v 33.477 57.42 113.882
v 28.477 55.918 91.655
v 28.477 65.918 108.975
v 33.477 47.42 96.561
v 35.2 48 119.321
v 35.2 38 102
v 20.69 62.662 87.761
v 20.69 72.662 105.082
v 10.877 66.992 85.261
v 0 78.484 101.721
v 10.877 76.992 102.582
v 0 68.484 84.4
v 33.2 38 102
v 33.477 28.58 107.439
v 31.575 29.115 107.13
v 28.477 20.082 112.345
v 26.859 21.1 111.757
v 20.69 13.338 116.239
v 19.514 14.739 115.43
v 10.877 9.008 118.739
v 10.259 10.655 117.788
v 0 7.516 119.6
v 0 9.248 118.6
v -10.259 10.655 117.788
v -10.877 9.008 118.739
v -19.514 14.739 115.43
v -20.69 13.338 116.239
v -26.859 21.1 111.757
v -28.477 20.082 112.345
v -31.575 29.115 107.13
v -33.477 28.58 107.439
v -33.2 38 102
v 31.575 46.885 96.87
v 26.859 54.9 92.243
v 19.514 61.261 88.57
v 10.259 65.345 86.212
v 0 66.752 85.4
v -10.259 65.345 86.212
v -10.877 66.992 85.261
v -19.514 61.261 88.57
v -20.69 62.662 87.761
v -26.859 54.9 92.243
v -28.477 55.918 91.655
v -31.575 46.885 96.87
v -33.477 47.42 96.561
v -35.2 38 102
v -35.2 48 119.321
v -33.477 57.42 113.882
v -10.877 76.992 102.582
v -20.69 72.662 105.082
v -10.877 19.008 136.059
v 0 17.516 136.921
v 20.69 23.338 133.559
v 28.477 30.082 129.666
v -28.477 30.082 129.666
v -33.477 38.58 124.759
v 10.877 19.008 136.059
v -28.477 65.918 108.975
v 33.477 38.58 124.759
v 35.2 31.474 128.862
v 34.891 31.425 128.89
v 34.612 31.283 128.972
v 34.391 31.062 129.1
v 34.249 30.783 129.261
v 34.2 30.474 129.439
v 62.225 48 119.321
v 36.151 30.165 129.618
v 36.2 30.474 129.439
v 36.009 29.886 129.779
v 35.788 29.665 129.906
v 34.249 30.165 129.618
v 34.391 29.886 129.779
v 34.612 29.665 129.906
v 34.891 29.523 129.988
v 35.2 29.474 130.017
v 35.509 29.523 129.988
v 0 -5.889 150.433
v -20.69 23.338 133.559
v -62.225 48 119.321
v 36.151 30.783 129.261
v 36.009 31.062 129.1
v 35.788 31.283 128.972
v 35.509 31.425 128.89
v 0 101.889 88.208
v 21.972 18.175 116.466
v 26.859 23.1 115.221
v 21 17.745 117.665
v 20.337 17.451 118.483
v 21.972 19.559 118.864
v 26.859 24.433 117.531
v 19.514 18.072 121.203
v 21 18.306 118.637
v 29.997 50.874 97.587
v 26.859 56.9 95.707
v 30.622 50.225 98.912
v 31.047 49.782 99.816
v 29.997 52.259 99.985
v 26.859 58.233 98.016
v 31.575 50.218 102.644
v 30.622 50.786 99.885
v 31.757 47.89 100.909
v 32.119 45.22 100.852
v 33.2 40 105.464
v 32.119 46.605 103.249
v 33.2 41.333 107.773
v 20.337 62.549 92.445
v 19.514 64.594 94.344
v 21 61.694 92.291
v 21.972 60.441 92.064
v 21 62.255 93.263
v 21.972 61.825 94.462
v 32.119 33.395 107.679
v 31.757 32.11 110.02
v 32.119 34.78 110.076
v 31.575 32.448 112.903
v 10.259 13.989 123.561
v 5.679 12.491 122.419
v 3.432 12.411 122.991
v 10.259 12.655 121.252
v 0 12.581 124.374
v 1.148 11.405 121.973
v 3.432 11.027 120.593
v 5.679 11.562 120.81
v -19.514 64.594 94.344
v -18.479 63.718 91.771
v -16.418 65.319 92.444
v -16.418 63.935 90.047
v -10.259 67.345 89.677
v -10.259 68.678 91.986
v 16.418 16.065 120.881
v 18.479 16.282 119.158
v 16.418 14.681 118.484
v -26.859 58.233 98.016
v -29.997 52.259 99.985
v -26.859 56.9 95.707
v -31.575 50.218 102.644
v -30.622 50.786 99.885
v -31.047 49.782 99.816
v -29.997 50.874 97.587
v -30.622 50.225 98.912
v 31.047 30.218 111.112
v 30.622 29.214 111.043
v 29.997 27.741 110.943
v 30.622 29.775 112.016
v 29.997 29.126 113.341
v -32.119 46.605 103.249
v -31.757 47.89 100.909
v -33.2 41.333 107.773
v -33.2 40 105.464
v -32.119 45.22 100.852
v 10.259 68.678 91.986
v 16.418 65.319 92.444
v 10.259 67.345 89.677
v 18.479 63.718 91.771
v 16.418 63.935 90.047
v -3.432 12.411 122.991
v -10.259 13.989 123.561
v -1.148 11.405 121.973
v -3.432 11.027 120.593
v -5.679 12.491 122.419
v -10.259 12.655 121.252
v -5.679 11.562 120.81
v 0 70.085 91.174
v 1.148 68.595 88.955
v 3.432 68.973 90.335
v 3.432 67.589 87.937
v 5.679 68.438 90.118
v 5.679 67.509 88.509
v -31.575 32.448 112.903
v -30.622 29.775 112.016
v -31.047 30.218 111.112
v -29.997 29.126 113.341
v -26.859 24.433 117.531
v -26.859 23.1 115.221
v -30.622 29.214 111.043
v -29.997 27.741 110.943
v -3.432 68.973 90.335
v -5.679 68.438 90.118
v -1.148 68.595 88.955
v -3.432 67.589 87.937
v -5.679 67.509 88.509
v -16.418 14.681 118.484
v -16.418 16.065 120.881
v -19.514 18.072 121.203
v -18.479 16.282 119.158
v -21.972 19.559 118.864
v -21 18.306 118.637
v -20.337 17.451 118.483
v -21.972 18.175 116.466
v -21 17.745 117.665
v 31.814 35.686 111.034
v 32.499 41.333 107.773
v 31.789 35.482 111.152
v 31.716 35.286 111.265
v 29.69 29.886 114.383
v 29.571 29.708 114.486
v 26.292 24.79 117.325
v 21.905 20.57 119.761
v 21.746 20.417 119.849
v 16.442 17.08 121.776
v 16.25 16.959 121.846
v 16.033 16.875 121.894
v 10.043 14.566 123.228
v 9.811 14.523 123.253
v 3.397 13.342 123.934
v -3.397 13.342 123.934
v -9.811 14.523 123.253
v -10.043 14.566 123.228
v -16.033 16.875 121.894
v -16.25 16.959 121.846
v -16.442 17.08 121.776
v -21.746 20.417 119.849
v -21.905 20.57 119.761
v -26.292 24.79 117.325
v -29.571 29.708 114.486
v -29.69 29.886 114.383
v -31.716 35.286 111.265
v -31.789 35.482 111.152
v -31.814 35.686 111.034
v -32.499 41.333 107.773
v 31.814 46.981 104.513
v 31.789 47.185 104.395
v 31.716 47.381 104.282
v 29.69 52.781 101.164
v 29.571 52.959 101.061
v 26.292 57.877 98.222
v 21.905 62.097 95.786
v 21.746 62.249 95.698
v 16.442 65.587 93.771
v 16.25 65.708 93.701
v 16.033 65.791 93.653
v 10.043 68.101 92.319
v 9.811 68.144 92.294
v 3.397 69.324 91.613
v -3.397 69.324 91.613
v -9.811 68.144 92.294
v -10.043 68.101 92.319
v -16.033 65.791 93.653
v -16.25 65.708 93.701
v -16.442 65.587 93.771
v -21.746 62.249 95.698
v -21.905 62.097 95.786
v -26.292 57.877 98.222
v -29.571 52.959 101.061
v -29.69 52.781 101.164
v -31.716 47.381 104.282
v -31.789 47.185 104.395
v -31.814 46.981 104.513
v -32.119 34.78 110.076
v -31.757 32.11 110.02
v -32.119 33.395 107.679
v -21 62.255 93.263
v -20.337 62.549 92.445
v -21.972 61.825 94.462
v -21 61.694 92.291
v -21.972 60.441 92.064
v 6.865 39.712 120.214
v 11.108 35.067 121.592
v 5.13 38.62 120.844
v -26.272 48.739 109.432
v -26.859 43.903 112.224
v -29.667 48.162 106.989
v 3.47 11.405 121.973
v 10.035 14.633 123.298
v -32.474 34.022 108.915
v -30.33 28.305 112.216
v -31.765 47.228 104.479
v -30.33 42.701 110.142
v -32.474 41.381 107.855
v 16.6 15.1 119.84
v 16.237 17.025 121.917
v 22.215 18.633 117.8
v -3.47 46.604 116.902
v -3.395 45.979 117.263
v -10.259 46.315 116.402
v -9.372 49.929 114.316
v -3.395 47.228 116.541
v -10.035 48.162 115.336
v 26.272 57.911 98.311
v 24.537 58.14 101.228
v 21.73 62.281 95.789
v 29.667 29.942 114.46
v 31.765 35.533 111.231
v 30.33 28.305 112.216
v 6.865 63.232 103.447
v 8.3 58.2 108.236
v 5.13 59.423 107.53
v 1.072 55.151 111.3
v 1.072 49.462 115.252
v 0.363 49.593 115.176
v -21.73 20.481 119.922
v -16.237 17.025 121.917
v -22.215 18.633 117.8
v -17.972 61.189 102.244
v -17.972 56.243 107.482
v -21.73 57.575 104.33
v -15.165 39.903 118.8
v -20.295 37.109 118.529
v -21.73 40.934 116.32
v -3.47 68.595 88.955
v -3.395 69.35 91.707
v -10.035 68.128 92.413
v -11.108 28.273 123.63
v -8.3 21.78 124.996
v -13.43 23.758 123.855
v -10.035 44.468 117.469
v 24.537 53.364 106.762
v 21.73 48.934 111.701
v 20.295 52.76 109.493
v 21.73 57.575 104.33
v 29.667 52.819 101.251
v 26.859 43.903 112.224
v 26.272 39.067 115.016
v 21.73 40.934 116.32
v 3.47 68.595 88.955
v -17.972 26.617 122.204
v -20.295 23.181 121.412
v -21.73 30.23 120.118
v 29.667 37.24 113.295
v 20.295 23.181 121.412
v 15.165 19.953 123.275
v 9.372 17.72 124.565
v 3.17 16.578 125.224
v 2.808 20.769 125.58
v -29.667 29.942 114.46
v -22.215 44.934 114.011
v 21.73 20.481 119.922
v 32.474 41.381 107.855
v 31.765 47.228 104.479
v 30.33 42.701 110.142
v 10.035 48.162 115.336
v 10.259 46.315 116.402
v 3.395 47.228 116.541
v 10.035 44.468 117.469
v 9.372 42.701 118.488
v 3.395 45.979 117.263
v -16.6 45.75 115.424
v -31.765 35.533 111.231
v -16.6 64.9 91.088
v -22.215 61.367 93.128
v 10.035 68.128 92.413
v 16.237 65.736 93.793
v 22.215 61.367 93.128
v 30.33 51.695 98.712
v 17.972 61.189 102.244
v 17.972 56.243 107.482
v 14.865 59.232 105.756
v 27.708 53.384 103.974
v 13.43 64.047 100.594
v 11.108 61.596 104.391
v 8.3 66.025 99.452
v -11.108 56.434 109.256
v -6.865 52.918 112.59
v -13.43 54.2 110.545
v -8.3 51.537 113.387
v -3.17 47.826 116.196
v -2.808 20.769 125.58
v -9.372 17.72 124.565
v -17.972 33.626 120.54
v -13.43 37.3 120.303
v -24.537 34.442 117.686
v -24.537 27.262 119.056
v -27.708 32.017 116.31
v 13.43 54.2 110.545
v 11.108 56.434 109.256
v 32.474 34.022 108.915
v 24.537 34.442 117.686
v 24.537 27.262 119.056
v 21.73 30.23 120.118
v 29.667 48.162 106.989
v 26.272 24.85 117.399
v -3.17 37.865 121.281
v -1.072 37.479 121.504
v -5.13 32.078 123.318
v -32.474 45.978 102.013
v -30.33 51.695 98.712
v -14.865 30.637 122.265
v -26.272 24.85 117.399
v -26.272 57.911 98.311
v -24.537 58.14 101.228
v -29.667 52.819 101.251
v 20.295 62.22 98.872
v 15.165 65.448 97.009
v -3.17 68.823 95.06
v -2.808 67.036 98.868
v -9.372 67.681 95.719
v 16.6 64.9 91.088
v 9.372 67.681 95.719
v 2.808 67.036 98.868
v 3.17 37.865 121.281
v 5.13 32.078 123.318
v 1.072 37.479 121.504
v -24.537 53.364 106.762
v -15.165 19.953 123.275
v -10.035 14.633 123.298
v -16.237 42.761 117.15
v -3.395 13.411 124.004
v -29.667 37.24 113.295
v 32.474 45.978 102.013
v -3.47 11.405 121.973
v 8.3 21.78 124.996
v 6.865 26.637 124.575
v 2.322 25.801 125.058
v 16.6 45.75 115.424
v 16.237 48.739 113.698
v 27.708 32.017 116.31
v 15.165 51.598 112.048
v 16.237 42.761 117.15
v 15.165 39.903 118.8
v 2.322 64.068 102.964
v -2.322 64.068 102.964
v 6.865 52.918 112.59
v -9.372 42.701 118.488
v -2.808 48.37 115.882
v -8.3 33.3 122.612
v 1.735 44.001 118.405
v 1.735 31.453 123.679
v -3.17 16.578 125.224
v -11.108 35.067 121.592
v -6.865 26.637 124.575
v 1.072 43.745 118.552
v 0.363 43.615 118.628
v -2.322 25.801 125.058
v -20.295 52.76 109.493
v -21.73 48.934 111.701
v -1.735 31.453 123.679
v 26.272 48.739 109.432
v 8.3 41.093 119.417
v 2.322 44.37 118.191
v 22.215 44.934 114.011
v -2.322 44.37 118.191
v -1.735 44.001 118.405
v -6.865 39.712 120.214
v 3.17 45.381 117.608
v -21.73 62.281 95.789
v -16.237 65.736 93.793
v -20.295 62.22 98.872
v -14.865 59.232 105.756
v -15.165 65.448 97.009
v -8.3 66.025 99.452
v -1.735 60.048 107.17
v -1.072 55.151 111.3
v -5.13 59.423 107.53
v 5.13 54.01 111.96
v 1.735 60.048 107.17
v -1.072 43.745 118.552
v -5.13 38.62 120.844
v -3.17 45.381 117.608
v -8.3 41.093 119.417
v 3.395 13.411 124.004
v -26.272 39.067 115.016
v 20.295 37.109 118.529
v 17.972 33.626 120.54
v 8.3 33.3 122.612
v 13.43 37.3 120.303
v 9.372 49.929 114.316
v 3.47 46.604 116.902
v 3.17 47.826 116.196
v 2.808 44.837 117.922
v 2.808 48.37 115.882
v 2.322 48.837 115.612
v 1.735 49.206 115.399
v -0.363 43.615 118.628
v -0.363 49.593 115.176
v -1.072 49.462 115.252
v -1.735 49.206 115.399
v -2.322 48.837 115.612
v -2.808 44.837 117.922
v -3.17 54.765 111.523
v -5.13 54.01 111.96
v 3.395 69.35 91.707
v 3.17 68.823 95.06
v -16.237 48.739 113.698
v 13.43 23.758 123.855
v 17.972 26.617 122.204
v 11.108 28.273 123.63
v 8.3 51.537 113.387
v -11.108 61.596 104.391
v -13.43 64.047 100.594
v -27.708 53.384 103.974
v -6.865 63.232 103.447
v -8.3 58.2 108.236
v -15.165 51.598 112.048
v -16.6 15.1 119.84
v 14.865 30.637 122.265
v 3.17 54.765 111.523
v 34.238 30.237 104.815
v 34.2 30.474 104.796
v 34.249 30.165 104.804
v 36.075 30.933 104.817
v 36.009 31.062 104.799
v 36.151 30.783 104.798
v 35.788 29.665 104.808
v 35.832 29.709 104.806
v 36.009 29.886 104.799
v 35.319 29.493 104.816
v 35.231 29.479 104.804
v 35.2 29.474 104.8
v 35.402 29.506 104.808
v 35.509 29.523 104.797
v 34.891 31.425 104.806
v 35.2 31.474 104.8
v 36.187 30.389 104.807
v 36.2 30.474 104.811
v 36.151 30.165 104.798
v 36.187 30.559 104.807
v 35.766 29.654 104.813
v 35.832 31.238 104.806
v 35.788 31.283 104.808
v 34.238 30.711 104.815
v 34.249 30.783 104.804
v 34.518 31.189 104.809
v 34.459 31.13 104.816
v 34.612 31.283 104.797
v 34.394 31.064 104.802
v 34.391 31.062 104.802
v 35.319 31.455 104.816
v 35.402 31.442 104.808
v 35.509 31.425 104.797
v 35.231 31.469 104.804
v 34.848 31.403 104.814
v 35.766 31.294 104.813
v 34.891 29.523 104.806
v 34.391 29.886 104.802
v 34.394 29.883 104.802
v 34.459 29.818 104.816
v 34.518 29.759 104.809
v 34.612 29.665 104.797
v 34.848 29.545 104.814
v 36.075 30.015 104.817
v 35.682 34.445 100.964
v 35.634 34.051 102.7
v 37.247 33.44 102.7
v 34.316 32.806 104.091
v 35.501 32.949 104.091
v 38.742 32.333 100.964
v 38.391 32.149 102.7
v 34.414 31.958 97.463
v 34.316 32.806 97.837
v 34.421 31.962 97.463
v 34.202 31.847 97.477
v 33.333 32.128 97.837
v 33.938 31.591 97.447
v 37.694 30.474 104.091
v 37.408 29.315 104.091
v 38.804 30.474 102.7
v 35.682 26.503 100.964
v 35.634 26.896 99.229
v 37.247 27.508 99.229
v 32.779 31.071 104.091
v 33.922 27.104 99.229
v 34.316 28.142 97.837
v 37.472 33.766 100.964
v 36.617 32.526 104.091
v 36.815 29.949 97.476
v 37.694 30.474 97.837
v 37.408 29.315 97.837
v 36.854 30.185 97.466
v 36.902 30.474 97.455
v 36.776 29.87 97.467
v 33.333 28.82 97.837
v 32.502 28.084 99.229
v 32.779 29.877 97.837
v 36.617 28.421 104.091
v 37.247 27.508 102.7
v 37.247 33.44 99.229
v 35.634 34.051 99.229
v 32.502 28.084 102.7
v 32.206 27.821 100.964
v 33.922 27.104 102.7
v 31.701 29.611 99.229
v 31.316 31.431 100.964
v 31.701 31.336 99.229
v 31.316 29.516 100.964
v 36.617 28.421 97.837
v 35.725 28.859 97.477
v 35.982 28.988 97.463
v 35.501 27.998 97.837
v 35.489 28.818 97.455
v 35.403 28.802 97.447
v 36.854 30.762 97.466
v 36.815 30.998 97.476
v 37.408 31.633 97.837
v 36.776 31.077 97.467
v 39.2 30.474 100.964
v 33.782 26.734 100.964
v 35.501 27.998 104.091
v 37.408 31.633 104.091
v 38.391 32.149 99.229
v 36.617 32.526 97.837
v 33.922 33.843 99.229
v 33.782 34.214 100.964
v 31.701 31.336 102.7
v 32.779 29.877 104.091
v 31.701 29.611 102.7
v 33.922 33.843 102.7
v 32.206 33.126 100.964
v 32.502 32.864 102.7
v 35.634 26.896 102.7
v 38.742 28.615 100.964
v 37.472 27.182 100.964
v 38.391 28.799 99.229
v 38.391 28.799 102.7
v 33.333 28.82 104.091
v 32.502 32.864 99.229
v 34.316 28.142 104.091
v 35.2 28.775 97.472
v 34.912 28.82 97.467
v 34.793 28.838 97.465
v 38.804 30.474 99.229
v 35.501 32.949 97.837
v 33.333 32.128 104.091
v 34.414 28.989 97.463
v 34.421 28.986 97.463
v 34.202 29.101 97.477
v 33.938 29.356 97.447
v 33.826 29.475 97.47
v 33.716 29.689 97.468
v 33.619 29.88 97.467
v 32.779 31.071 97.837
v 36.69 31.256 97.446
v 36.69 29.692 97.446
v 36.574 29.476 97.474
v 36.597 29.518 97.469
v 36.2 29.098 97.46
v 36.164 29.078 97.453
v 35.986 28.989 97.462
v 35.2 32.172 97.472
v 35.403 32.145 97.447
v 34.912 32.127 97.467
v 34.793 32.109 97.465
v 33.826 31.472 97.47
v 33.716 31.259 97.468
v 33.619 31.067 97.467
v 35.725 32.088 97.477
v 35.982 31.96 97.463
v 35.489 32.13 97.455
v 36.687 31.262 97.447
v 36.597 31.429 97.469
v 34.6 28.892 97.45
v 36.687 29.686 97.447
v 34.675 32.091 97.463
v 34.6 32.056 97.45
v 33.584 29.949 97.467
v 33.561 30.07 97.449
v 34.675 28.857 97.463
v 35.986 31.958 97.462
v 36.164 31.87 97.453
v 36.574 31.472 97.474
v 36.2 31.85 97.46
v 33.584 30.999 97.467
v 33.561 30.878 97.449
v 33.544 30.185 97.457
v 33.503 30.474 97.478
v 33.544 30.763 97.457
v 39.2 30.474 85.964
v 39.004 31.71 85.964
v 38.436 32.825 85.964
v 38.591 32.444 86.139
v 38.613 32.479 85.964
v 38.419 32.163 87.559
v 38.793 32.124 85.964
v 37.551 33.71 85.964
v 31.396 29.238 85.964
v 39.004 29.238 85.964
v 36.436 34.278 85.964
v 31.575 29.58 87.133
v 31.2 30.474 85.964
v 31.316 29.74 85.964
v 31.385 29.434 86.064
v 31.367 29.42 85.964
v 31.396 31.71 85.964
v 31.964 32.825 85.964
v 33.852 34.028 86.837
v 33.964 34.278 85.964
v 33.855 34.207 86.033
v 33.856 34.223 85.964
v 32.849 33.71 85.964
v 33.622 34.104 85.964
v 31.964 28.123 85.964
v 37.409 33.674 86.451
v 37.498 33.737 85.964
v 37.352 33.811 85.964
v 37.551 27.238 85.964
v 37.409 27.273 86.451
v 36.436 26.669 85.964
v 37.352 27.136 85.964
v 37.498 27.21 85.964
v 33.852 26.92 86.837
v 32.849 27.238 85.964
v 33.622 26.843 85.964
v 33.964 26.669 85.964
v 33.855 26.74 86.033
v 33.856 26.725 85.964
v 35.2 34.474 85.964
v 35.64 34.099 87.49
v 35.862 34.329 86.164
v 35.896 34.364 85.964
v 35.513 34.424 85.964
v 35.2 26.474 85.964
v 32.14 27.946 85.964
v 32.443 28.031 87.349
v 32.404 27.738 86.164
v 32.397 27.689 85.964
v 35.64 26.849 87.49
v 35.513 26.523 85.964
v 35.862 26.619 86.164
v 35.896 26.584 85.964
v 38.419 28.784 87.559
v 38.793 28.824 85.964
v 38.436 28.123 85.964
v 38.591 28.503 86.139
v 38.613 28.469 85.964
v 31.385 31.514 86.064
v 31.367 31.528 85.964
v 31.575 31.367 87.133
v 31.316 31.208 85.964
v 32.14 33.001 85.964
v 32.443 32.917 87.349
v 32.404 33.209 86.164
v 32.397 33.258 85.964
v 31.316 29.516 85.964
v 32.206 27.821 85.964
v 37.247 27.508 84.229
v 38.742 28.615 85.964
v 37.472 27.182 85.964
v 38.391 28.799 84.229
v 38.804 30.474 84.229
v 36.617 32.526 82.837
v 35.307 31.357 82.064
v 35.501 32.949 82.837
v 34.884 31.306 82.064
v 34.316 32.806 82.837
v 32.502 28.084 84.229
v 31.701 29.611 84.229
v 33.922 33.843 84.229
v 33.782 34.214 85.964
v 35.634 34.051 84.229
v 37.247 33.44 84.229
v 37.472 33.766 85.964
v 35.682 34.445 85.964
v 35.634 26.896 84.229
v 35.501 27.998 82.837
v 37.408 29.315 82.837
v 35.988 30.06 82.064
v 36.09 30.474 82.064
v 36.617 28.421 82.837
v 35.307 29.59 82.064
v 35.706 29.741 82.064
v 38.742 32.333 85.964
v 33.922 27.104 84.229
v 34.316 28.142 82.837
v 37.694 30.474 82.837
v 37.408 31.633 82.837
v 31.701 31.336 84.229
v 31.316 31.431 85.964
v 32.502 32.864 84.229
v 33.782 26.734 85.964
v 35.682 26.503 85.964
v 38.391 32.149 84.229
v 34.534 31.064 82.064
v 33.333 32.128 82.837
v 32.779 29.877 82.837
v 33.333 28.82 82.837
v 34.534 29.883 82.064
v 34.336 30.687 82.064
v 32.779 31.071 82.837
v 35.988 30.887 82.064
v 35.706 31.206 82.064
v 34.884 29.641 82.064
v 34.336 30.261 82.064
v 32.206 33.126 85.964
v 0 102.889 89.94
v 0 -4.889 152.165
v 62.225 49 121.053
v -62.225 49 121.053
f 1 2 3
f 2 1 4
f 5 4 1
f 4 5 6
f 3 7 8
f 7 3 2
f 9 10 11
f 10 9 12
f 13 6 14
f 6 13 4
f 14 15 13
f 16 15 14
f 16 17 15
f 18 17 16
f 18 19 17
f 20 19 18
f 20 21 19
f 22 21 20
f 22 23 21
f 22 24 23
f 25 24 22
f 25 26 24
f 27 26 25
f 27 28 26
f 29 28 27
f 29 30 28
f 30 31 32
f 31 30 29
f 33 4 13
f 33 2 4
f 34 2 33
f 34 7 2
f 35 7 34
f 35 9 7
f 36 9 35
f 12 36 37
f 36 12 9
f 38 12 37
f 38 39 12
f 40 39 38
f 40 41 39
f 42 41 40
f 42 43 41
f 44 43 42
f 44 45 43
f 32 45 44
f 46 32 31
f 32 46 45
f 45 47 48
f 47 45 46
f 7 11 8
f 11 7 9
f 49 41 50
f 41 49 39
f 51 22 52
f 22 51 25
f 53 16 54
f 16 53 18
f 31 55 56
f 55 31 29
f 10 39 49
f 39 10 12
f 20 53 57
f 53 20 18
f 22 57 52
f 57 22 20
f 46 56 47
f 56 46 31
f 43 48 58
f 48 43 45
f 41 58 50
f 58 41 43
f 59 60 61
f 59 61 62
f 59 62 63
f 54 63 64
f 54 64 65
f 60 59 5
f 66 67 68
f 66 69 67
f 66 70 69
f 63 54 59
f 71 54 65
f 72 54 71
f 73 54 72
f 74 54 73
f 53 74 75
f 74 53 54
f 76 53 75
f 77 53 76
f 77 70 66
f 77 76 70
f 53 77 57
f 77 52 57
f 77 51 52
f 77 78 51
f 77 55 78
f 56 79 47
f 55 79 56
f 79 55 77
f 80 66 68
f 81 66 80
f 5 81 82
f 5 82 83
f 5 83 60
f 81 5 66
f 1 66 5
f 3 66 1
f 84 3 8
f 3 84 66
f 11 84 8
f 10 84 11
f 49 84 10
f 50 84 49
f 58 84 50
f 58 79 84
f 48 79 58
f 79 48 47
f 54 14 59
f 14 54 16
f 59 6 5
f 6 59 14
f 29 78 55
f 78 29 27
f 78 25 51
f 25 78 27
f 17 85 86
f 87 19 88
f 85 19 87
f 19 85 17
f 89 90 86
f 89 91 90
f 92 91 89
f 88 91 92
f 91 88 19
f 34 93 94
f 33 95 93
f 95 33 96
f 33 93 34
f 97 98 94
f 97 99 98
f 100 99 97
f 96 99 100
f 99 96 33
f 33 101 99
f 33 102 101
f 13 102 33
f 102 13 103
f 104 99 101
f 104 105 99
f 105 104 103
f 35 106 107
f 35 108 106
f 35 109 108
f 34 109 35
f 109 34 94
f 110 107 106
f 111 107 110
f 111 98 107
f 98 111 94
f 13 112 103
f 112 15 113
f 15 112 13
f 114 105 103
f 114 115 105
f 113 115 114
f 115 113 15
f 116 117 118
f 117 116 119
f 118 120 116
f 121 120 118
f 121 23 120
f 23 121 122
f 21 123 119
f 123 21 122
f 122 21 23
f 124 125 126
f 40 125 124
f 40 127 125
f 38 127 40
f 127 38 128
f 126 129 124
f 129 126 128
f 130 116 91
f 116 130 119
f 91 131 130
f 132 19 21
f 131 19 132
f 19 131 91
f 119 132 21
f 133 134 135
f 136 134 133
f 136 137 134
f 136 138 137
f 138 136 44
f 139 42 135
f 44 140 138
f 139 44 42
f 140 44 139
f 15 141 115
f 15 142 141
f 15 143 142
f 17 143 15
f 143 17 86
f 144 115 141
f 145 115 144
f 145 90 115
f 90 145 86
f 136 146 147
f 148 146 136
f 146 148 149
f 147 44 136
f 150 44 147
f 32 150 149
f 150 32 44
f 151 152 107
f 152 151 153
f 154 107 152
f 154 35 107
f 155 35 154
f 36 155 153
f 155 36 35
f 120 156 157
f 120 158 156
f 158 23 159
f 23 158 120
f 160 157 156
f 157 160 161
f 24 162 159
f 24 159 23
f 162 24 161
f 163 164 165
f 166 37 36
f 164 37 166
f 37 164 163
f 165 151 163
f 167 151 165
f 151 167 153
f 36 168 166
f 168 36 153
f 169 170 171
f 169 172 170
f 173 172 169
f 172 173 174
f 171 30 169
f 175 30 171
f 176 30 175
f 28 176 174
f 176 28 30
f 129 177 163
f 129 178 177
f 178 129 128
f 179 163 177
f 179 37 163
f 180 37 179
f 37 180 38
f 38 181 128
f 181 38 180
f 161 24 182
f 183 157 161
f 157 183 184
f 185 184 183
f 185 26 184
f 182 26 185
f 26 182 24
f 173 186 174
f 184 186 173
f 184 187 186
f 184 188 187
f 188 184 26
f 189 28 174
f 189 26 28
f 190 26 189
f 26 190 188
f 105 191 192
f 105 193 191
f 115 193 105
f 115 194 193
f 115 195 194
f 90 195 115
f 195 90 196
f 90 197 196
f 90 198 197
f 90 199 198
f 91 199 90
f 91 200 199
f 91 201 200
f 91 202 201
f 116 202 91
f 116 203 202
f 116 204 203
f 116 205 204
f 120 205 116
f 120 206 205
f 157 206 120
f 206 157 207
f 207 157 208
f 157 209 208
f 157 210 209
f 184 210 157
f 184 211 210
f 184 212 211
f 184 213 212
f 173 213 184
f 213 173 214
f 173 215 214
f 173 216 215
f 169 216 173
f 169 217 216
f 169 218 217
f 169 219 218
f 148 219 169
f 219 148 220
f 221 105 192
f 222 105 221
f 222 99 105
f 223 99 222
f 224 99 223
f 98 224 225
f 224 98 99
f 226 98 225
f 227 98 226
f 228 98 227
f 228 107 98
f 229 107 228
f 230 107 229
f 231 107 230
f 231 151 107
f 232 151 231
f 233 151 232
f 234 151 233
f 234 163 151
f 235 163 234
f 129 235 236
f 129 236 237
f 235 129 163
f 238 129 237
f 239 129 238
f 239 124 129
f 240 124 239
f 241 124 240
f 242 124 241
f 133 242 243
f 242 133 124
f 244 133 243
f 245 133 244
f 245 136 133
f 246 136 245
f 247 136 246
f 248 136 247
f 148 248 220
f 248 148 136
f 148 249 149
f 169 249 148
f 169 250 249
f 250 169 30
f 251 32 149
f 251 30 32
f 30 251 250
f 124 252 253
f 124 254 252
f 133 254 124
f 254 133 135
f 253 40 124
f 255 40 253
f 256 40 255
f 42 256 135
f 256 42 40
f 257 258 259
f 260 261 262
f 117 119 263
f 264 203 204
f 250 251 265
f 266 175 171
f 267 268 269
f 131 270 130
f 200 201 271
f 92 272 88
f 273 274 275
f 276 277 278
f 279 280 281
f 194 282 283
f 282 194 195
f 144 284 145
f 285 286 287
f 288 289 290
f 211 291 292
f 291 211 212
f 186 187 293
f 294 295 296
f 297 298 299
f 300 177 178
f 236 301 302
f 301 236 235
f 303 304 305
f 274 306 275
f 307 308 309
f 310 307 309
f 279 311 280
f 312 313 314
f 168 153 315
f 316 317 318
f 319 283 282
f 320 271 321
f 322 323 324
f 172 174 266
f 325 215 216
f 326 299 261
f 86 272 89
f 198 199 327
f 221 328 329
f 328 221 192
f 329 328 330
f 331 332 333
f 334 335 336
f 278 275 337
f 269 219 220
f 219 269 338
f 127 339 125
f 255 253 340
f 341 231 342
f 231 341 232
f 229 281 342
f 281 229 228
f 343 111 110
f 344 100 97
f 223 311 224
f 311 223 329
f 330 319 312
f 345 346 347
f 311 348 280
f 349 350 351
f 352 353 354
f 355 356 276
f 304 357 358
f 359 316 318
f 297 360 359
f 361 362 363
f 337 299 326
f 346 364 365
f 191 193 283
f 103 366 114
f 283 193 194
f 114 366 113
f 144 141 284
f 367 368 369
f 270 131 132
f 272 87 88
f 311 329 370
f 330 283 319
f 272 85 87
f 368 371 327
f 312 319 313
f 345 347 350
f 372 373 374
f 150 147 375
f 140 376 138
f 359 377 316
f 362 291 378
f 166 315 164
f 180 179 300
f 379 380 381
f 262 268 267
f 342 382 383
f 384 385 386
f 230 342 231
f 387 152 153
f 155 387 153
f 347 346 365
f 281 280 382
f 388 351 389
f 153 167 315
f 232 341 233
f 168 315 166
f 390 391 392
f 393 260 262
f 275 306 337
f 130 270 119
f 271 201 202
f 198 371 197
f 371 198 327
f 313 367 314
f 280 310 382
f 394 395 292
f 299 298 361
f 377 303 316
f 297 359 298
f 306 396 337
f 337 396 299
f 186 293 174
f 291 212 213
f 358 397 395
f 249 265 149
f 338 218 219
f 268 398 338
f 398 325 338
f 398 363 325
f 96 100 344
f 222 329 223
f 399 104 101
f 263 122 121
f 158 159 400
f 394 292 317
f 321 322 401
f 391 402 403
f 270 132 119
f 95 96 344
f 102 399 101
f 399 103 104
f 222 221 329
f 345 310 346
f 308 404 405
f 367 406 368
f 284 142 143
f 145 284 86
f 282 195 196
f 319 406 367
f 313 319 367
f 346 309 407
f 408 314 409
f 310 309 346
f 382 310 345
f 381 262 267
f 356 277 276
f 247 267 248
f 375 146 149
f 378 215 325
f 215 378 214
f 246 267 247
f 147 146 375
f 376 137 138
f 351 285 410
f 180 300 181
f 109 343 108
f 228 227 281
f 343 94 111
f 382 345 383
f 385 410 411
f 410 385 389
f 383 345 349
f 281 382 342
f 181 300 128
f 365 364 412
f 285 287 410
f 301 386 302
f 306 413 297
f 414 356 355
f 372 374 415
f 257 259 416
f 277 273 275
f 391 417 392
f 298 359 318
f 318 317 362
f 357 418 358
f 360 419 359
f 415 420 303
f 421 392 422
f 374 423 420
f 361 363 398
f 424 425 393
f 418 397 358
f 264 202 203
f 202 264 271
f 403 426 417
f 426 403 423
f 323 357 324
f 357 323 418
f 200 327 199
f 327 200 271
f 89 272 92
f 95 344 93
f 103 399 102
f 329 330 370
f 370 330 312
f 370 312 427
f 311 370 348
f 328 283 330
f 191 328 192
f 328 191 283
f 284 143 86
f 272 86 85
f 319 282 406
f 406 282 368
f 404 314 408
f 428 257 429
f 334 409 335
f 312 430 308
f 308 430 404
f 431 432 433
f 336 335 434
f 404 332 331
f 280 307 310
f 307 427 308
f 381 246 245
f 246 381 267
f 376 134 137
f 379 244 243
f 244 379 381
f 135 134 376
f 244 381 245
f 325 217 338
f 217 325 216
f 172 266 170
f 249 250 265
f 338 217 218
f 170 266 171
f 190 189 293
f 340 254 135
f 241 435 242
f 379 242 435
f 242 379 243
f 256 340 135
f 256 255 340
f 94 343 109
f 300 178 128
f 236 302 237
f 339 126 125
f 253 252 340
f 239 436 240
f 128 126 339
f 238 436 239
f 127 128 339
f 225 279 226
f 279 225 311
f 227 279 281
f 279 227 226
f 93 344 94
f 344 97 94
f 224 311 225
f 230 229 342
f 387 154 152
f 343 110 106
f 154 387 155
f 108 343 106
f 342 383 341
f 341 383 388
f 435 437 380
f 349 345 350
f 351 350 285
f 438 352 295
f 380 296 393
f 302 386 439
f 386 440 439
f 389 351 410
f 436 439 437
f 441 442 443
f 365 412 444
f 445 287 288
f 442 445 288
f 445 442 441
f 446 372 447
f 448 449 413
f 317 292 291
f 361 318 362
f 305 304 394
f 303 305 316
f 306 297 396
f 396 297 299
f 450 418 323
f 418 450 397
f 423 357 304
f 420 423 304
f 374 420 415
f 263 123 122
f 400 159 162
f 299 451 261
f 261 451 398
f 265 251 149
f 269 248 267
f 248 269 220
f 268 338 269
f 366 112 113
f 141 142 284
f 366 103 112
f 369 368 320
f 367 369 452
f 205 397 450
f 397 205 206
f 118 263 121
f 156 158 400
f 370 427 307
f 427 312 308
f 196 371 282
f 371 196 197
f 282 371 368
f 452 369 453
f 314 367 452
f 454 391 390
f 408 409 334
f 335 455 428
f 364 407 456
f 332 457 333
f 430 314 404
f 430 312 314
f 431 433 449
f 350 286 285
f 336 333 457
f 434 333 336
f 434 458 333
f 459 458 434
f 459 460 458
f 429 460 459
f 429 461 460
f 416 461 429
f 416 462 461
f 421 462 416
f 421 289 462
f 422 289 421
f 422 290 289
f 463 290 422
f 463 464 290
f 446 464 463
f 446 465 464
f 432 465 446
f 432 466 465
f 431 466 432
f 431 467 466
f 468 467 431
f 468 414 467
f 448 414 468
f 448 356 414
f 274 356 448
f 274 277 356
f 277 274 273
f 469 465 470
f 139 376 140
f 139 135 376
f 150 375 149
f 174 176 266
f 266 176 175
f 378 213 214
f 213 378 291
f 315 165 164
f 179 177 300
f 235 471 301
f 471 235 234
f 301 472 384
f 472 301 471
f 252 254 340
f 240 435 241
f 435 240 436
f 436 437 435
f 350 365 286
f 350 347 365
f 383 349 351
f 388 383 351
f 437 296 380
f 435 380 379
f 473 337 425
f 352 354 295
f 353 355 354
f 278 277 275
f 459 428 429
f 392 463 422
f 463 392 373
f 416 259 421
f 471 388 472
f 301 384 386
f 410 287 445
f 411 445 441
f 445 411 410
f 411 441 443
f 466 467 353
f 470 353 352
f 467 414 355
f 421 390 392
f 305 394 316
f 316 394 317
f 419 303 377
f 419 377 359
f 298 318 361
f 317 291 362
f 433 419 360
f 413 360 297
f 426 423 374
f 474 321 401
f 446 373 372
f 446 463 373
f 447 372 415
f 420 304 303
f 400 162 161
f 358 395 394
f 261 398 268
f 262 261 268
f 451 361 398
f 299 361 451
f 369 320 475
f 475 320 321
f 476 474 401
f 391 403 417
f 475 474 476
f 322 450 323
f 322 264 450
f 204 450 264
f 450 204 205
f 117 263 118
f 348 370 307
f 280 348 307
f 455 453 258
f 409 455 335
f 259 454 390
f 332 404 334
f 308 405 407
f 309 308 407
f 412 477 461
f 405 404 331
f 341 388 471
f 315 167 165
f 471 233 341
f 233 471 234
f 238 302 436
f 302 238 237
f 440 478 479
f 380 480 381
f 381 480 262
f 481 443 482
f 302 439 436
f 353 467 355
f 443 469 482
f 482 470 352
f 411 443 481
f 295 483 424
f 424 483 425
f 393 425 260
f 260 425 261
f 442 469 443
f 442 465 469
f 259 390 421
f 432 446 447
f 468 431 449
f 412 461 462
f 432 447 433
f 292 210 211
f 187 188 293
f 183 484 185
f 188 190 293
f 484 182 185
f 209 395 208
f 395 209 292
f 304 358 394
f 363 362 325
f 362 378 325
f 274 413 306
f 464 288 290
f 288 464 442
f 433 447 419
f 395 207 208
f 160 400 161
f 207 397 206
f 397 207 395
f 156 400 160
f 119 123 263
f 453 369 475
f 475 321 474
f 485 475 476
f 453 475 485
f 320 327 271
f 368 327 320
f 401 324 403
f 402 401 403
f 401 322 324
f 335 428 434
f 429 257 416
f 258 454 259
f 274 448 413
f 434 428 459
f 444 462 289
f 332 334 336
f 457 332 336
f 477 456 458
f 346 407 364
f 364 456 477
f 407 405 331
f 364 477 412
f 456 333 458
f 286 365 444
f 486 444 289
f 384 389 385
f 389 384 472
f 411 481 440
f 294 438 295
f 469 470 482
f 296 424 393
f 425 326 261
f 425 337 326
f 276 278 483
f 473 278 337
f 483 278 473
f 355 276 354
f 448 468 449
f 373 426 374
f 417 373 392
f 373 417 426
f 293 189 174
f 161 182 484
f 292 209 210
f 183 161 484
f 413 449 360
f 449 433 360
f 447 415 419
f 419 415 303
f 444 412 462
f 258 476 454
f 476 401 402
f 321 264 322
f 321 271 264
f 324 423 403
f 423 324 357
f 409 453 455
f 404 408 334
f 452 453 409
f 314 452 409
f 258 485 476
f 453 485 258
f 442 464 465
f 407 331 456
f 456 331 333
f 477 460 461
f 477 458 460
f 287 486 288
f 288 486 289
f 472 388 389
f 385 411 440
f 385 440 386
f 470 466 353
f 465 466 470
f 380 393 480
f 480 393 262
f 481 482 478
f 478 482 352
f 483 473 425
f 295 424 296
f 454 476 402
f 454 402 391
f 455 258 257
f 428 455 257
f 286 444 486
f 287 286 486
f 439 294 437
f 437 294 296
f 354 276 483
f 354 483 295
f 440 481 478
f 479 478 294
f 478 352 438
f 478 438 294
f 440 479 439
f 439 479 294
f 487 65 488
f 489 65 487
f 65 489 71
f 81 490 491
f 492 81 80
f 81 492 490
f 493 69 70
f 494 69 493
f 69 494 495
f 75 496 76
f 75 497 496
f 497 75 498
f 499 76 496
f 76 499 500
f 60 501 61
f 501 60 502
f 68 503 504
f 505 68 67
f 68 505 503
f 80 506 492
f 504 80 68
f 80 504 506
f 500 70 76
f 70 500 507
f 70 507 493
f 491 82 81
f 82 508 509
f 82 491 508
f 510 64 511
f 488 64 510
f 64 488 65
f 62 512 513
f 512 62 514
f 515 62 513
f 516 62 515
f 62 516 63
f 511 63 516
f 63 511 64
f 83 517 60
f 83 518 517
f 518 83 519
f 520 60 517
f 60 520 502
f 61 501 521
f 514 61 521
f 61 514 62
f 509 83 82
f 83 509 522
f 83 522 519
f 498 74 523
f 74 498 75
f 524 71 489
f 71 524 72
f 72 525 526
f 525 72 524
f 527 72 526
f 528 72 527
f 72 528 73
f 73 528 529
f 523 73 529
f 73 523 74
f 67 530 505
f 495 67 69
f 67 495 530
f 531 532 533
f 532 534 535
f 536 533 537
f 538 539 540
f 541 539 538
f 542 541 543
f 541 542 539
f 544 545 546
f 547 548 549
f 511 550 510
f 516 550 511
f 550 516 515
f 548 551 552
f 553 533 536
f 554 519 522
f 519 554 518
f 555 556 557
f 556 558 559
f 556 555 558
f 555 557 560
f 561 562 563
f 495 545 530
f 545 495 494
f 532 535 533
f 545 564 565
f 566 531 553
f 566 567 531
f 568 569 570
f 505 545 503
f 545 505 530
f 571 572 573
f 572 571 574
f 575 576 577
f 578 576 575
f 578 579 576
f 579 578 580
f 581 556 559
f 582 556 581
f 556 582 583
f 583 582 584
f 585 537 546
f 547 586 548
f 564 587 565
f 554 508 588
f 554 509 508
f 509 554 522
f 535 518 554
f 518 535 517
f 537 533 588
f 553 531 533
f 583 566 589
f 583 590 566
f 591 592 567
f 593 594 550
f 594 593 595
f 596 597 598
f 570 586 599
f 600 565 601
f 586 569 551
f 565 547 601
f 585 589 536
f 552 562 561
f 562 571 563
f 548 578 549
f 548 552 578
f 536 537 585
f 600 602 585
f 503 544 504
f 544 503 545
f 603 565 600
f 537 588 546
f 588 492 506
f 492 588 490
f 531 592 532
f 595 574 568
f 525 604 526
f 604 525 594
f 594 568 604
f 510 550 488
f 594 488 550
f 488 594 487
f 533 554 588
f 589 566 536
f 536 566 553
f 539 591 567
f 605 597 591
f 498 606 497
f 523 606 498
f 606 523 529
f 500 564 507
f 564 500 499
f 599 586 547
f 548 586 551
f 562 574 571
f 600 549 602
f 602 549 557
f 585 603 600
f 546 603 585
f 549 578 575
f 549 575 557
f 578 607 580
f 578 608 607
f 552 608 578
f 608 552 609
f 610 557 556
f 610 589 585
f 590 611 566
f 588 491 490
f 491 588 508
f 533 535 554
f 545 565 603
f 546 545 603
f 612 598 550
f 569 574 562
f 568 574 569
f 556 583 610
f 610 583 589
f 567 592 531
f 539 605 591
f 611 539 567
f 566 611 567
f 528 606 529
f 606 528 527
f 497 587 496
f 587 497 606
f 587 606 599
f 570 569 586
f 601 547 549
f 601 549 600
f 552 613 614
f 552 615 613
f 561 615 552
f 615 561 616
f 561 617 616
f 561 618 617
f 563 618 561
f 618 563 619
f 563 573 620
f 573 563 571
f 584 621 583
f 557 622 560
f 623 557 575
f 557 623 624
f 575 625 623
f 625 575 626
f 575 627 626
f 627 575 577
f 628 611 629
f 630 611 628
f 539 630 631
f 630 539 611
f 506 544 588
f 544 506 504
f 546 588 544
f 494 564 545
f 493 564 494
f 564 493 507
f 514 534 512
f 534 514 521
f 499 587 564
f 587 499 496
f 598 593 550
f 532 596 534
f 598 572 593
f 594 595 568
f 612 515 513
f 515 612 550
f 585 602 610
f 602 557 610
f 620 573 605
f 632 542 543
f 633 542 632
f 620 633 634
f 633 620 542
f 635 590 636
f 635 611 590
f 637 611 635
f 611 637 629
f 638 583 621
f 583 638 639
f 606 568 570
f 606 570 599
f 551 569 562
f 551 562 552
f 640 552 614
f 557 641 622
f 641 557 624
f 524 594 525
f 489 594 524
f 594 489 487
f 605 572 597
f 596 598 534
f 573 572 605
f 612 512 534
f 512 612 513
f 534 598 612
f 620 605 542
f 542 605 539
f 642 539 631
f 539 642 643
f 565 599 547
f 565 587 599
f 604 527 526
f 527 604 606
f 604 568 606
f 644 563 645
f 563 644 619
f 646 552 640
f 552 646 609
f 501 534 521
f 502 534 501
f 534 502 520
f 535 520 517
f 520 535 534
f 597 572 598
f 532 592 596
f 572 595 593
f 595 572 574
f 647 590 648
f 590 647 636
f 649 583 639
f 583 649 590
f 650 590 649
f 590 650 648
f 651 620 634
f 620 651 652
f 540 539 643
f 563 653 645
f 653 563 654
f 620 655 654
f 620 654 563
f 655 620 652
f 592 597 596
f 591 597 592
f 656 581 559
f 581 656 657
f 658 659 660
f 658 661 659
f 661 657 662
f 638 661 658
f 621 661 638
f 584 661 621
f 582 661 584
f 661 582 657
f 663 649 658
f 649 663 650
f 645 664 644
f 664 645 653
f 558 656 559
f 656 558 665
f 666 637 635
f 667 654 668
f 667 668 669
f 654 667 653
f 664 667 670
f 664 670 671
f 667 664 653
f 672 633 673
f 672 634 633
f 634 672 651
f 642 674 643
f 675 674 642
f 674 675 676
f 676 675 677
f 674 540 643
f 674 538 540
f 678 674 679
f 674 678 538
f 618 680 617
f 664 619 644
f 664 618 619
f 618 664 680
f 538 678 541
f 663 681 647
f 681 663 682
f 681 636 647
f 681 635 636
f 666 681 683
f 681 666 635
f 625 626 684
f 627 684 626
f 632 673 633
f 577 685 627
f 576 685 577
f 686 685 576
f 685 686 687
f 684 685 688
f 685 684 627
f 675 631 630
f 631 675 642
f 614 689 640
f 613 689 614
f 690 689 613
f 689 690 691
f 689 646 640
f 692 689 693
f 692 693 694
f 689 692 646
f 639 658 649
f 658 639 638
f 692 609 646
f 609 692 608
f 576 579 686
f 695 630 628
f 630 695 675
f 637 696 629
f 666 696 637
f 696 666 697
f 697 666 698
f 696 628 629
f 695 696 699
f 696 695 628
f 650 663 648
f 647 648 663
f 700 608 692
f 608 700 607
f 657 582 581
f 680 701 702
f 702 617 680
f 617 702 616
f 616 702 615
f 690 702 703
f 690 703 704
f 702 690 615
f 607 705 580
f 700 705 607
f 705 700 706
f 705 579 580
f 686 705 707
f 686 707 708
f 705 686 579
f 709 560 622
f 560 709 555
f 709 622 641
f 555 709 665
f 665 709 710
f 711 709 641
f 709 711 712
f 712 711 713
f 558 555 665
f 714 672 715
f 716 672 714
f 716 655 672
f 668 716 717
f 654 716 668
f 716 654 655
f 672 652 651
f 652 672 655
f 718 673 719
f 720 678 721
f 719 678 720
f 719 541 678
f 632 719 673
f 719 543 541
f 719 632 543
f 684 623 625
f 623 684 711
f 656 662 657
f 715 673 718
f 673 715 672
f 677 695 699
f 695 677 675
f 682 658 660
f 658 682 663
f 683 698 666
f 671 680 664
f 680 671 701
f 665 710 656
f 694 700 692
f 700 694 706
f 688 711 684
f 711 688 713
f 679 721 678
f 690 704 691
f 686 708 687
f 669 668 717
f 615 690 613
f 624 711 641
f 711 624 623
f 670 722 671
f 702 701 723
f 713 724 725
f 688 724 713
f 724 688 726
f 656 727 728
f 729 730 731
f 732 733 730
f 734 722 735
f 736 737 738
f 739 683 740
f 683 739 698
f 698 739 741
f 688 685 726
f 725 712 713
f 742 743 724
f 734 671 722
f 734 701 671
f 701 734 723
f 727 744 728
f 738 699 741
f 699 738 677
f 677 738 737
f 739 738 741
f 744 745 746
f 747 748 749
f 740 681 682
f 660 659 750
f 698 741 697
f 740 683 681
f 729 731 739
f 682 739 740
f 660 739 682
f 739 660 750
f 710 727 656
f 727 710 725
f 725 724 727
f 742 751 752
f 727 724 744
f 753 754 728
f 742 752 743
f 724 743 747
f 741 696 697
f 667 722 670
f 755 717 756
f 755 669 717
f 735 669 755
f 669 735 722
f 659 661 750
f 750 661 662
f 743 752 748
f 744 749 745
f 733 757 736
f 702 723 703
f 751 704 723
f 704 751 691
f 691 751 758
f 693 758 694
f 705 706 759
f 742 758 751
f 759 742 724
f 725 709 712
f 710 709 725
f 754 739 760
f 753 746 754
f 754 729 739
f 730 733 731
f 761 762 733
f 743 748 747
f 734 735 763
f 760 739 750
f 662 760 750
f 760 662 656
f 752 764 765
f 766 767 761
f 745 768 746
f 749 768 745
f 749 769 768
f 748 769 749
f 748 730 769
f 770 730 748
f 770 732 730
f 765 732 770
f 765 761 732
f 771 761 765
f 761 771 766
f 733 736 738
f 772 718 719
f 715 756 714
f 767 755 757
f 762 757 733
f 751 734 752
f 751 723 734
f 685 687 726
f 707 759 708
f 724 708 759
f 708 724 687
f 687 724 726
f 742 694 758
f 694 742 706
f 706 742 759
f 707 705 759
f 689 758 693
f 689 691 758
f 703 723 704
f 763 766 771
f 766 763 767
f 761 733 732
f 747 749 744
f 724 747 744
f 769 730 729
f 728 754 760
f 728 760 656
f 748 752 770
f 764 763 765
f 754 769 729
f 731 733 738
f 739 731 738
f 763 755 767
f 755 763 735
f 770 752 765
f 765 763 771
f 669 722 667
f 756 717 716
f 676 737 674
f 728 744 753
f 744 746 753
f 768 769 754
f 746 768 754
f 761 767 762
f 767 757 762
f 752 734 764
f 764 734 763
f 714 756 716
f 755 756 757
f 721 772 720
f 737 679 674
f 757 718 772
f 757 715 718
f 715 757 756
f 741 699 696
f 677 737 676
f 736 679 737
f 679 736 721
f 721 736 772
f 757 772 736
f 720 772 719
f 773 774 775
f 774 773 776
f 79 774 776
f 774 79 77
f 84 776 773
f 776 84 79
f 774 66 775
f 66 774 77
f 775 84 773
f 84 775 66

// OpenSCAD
angle = 60;
hauteur_totem = 100;
echelle_totem = 0.5;
largeur_totem = echelle_totem*88;
longueur_totem = echelle_totem*176;
profondeur_creux = 2;
echelle_sqli = 0.75;
hauteur_sqli = echelle_sqli*13;
largeur_sqli = echelle_sqli*201;
hauteur_chapeau = 20;
rayon_chapeau = longueur_totem/2.5;

epaisseur = 2;

detail = 20;


module biseau(){
	hauteur = largeur_totem*tan(angle);
	rotate([0,90,0]) 
		linear_extrude(height=100, center=false, convexity=0) 
		polygon(points=[
			[0,largeur_totem],
			[0,0],
			[hauteur,0]
		], path=[[0,1,2]]);
}

module totem_creux(){
	translate([-longueur_totem/2,0,0])
	difference(){
		translate([0,0,hauteur_totem/2]) 
	    linear_extrude(height=hauteur_totem, center=true, convexity=0) 
	    	scale(echelle_totem) 
	    	import("logo_tsg_hollow_perspective.dxf");
		translate([-1,-1,hauteur_totem+0.1]) 
			biseau();
	}
}

module totem_plein(){
	hauteur = hauteur_totem-profondeur_creux;
    translate([-longueur_totem/2,0,0])
	difference(){
		translate([-0.15,-0.25,hauteur/2]) 
	    linear_extrude(height=hauteur, center=true, convexity=0) 
	    	scale(echelle_totem) 
	    	import("logo_tsg_plein_perspective.dxf");
		translate([-1,-1,hauteur+0.1]) 
			biseau();
	}
}

module sqli(){
    translate([-largeur_sqli/2,-8,0])
	rotate([angle,0,0]) 
    linear_extrude(height=hauteur_sqli, center=true, convexity=0) 
	    	scale(echelle_sqli) 
	    	import("logo-sqli.dxf");
}

module chapeau(){
	difference() {
		cylinder(h=hauteur_chapeau, r=rayon_chapeau, $fn=detail);
    	cylinder(h=hauteur_chapeau/3, r=rayon_chapeau-epaisseur, $fn=detail);
        translate([0,0,4]) scale([1,1,0.4]) sphere(r=rayon_chapeau-epaisseur);
	}
	rotate([0,0,45])
	translate([0,0,hauteur_chapeau+epaisseur/2])
	cube([2.5*rayon_chapeau,2.5*rayon_chapeau,epaisseur], center = true);
    translate([1*rayon_chapeau,-11,4]) 
    rotate([90-angle,0,0])
    union(){
    	translate([0,0,-0.5*hauteur_chapeau])
    	cylinder(h=1.5*hauteur_chapeau, r=1, $fn=detail);
    	translate([0,0,-0.5*hauteur_chapeau])
    	sphere(4);
    	translate([0,0,-1.25*hauteur_chapeau])
    	cylinder(h=0.75*hauteur_chapeau, r2=1, r1=4, $fn=detail);
        translate([0,0,-1.25*hauteur_chapeau]) sphere(4);
    }
    
}
translate([0,38,hauteur_totem+2])
rotate([-(90-angle),0,0]) chapeau();
color("green") sqli();
color("red") totem_creux();
color("blue") totem_plein();
